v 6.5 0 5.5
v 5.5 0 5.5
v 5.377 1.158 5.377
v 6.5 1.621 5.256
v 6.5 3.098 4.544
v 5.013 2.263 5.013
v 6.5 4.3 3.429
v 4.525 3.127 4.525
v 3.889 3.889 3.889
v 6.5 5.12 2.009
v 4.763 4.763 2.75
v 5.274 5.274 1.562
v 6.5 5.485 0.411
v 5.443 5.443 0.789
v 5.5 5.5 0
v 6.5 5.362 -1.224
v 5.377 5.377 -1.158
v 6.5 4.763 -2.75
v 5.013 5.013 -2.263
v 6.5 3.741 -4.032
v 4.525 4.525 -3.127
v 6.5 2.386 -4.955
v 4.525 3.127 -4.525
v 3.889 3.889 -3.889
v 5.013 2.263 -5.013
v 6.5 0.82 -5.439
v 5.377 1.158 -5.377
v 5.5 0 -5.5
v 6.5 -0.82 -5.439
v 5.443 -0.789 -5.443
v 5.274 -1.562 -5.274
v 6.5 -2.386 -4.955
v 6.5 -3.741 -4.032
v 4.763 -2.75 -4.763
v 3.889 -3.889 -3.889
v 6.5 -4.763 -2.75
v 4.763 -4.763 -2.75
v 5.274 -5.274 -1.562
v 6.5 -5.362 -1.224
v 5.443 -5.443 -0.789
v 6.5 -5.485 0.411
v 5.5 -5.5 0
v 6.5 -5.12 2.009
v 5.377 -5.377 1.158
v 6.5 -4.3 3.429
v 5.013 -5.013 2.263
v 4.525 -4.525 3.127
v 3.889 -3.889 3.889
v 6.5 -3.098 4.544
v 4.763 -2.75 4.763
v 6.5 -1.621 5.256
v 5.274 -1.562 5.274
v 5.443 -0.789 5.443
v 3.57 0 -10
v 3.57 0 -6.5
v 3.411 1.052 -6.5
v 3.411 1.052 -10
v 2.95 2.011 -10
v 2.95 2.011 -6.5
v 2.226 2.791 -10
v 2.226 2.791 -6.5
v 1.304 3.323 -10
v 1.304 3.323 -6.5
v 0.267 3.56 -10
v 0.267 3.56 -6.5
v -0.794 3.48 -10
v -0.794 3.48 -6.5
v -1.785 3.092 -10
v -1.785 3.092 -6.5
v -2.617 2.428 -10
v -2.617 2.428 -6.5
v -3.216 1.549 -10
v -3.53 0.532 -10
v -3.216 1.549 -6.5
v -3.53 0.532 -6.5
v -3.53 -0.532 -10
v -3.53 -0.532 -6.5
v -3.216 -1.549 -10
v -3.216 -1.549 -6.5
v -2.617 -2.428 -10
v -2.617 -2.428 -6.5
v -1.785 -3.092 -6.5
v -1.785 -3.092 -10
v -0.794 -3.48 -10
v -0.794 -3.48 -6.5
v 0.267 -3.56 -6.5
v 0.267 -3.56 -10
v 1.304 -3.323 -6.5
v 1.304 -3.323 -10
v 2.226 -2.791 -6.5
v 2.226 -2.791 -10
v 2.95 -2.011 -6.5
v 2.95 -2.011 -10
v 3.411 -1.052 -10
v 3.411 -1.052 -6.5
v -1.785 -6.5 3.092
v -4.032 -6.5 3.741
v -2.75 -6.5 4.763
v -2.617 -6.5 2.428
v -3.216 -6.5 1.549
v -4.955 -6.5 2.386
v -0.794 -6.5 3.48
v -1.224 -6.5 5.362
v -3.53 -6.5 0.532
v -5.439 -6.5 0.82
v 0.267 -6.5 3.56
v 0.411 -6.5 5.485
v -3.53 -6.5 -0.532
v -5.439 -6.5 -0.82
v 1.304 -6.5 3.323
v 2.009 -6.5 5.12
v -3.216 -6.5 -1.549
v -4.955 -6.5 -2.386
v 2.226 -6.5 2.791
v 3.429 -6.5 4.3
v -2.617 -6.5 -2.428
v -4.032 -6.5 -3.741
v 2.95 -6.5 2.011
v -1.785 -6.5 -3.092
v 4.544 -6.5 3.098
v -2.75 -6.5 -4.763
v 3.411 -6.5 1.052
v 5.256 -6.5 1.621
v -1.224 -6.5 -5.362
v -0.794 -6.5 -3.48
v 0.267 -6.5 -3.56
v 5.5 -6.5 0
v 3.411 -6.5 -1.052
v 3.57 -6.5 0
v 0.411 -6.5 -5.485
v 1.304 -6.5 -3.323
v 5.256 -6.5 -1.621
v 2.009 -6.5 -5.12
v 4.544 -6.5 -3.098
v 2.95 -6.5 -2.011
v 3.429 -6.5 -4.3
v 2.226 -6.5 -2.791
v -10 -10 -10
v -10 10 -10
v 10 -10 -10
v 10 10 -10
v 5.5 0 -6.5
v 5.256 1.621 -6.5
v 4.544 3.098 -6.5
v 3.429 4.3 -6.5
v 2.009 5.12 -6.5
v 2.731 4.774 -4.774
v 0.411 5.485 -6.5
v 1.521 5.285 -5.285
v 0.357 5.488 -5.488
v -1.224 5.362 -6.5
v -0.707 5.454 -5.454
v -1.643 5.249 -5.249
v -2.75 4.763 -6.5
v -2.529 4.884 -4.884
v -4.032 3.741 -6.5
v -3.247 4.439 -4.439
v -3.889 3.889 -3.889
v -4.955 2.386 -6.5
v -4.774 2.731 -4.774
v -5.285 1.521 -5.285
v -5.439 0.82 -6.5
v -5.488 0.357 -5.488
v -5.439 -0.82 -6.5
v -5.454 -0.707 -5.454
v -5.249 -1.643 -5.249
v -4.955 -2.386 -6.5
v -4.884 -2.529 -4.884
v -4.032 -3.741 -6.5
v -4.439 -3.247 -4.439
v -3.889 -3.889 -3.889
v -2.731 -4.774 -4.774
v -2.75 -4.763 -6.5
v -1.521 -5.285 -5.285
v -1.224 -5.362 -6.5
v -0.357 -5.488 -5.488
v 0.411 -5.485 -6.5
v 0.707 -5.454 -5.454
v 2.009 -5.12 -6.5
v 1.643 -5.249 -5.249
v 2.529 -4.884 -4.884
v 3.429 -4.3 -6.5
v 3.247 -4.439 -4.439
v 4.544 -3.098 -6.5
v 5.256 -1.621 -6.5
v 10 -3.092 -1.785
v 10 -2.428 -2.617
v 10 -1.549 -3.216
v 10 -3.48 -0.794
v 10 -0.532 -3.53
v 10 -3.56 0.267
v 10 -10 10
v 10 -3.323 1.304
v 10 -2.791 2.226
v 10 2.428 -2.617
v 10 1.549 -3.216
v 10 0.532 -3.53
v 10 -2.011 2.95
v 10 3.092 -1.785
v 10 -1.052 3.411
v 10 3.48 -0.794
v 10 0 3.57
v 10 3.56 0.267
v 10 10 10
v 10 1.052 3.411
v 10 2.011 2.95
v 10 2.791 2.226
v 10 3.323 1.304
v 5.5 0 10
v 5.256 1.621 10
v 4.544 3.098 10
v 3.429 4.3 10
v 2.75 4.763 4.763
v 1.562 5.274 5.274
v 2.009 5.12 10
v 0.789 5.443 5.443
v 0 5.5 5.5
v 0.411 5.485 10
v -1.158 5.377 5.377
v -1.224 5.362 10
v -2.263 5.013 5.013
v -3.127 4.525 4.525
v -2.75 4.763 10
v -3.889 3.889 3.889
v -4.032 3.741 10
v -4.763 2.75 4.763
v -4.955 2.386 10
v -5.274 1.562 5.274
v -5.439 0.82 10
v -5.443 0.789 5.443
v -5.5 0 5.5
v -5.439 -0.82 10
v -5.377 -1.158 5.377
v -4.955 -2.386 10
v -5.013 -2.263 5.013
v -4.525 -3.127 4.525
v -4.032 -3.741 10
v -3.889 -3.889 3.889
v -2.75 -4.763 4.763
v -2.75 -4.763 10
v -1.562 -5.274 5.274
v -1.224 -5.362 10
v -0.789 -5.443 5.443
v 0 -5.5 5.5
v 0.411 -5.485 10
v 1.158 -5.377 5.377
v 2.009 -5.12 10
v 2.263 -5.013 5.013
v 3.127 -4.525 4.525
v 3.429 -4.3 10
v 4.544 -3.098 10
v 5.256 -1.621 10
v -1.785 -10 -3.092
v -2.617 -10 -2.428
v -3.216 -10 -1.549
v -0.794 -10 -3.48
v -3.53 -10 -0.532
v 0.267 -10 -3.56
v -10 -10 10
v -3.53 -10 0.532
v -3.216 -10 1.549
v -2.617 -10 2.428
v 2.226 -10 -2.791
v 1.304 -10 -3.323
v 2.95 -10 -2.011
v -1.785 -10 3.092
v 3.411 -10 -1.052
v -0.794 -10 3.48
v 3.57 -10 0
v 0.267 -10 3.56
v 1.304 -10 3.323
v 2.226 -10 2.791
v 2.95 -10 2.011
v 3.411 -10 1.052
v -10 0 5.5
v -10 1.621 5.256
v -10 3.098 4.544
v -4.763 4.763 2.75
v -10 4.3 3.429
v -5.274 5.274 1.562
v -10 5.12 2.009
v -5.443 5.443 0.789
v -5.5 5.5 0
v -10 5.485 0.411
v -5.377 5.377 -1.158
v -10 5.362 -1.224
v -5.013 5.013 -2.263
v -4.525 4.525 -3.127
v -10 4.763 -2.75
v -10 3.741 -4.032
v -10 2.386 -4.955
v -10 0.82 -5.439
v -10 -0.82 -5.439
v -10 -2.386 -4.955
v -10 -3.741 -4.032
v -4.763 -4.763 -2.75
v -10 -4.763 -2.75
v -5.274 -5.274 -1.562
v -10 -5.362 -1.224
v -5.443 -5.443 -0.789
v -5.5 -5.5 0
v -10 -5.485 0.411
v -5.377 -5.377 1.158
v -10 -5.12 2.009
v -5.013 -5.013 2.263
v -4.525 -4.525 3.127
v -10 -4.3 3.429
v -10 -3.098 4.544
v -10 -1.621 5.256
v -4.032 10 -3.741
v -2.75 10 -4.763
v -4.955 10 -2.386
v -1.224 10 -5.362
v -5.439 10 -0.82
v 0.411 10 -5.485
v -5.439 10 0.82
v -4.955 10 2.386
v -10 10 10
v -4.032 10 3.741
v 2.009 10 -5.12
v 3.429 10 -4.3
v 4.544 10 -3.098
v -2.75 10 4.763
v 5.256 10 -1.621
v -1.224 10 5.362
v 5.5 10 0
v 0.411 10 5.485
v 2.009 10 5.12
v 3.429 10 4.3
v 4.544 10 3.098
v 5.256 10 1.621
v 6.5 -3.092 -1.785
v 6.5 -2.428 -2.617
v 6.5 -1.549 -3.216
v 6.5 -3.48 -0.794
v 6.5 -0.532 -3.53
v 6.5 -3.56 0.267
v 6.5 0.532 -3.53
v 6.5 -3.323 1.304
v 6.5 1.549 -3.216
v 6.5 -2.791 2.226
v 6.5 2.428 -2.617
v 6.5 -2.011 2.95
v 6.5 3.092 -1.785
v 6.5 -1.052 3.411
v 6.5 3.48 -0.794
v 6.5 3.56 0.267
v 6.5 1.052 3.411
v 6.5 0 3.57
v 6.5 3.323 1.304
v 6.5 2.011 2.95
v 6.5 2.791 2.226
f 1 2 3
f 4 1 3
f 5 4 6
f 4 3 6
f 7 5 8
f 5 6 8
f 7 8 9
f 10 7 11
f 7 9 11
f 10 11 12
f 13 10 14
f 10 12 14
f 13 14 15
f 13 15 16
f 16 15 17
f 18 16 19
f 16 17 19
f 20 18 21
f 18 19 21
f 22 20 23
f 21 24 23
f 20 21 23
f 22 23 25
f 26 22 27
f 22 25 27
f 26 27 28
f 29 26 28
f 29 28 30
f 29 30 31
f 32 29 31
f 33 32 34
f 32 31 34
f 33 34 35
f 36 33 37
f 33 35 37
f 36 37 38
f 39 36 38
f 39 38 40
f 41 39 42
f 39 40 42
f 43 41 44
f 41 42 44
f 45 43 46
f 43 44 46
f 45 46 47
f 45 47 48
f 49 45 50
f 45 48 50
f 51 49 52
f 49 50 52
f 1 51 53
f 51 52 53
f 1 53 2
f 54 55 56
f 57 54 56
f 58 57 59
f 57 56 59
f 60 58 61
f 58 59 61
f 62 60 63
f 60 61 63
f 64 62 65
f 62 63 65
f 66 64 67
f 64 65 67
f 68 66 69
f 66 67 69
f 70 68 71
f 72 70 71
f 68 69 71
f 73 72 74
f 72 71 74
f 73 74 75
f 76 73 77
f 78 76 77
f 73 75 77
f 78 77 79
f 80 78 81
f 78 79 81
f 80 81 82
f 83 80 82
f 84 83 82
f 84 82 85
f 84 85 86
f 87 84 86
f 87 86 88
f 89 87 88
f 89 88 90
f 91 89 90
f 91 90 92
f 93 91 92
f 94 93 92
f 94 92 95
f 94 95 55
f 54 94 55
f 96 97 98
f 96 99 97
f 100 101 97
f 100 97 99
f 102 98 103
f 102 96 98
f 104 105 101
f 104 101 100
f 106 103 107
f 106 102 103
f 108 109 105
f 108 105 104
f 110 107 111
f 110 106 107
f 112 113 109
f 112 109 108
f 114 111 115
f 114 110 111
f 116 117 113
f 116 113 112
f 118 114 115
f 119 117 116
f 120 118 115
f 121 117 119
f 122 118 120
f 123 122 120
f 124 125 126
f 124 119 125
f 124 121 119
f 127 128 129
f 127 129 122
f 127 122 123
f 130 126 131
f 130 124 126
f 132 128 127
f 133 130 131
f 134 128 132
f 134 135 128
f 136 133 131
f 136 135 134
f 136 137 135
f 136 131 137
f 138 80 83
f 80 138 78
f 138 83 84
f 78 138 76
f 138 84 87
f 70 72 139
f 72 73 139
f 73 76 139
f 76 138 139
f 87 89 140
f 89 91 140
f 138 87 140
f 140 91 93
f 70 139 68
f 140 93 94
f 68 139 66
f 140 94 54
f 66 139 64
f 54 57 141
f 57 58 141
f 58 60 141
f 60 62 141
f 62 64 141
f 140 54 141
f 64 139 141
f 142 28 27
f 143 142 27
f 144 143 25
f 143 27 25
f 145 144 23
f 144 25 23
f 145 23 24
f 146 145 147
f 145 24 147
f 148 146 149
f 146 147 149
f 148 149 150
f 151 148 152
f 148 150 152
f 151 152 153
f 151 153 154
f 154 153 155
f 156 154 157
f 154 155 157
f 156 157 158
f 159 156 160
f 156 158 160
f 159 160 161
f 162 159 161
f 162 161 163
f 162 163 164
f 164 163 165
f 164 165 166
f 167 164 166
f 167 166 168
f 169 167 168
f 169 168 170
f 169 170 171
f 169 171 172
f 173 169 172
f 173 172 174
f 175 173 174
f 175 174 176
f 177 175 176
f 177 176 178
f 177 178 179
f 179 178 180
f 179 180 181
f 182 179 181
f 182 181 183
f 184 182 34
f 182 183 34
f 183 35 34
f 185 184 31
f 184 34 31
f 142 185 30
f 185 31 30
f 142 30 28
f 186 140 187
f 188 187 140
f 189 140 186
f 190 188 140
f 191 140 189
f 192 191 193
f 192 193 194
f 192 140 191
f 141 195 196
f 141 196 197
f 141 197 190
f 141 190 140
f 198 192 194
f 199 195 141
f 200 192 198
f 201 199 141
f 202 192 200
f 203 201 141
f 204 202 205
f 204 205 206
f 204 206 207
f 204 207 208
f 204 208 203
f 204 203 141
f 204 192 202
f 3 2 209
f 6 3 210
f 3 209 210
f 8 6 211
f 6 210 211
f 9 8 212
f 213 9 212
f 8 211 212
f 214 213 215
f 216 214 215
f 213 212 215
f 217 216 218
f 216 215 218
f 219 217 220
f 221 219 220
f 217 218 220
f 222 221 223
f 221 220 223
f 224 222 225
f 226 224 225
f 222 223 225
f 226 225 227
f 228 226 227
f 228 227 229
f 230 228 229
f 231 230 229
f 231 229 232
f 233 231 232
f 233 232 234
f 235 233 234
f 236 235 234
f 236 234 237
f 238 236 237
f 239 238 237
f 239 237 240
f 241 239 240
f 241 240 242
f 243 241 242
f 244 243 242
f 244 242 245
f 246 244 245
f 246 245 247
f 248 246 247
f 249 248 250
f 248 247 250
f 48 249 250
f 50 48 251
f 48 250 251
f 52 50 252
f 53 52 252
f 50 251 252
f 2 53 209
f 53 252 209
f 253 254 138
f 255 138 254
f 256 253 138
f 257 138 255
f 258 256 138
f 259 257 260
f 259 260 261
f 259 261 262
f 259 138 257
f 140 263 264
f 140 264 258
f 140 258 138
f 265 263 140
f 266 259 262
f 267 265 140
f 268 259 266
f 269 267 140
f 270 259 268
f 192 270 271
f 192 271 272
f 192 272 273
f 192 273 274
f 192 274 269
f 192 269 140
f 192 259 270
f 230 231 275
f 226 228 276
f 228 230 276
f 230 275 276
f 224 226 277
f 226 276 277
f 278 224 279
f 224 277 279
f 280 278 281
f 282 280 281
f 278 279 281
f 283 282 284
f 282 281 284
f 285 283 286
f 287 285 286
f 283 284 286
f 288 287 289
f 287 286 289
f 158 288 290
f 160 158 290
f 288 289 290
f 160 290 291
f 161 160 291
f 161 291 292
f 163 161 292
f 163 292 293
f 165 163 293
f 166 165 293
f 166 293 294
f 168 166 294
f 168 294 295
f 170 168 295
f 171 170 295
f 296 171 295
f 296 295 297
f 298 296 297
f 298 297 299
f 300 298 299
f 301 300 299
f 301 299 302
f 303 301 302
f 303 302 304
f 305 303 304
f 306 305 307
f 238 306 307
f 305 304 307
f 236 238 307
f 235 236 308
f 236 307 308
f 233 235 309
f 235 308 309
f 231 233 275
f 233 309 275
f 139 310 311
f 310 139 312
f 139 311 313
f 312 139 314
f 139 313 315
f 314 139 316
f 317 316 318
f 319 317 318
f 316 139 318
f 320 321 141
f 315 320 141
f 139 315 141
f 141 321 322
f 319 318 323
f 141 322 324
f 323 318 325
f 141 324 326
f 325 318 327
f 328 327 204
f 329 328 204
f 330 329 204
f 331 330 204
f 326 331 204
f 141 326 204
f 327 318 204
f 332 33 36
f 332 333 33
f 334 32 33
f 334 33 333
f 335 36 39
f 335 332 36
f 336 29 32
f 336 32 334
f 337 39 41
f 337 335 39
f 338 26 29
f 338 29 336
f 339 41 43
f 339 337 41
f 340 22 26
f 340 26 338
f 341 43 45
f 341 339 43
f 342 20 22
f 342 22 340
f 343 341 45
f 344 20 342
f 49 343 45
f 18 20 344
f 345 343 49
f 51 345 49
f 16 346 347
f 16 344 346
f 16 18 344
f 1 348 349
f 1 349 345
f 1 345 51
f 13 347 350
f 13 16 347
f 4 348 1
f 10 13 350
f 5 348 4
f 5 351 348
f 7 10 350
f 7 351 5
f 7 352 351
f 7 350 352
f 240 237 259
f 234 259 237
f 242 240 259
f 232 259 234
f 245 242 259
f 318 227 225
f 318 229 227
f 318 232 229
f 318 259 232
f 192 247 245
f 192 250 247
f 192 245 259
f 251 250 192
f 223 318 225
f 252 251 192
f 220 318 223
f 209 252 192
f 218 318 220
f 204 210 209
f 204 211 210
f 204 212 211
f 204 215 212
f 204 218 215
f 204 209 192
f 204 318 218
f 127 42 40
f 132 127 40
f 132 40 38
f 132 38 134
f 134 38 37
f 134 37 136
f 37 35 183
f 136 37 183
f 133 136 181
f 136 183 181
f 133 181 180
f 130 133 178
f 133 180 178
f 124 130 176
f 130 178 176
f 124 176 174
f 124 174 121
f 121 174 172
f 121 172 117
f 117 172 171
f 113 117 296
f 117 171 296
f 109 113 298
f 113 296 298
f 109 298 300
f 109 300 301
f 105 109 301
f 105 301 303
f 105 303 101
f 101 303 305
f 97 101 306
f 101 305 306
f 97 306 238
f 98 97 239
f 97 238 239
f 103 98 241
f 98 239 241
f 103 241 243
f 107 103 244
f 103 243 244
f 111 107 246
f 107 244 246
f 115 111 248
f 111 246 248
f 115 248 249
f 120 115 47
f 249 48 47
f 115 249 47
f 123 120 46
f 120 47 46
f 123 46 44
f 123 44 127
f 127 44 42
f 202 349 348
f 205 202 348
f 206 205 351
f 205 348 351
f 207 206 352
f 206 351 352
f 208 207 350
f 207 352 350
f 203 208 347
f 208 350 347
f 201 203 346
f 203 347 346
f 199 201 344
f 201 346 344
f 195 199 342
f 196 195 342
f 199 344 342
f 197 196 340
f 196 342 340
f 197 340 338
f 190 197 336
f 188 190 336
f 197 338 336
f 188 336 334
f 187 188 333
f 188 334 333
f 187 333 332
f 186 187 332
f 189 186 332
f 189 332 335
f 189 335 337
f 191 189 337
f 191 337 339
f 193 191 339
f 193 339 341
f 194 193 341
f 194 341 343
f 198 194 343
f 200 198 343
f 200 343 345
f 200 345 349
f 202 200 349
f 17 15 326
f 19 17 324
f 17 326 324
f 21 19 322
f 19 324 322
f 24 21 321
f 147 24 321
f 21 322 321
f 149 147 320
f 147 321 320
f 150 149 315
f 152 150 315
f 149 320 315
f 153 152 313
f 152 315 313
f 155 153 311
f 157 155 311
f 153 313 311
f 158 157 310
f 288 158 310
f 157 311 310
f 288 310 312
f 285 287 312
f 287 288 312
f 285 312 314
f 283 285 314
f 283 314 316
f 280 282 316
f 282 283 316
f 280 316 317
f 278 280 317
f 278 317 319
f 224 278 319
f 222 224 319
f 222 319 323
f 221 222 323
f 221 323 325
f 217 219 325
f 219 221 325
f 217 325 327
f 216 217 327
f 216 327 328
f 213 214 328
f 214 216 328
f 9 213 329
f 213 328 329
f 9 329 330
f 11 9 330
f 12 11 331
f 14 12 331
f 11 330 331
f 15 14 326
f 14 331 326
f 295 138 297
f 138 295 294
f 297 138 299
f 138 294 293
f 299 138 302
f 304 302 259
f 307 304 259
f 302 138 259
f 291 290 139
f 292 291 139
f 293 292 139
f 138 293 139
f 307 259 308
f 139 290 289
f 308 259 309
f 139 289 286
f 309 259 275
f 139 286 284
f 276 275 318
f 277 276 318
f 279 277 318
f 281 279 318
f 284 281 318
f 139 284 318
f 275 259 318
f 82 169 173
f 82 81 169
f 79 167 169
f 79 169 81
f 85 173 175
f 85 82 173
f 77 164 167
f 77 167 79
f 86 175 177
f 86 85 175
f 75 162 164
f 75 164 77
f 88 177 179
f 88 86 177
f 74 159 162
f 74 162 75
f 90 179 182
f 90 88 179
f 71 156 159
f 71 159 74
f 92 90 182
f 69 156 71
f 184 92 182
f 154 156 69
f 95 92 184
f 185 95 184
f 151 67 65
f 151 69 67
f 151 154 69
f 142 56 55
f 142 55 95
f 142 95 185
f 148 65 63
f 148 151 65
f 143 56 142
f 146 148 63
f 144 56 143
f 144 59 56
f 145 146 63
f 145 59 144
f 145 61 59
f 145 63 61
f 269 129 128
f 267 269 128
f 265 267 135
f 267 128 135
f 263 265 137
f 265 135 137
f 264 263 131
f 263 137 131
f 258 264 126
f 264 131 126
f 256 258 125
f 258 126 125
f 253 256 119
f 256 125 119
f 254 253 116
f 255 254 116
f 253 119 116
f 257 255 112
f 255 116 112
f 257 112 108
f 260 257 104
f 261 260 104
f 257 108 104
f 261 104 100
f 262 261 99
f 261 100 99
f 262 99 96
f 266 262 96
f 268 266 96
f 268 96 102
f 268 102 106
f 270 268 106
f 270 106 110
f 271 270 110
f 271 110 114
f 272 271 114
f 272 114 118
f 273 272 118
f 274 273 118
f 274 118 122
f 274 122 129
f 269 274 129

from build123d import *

# Parameters (mm, degrees)
SKETCH1_W           = 20
SKETCH1_H           = 20
BOSS_EXTRUDE1_DEPTH = 10
SKETCH2_R           = 3.57
CUT_EXTRUDE1_DEPTH  = 21
SKETCH3_R           = 5.5
CUT_EXTRUDE2_DEPTH  = 16.5
SKETCH4_R           = 3.57
CUT_EXTRUDE3_DEPTH  = 21
SKETCH5_R           = 5.5
CUT_EXTRUDE4_DEPTH  = 16.5
SKETCH6_R           = 3.57
CUT_EXTRUDE5_DEPTH  = 21
SKETCH7_R           = 5.5
CUT_EXTRUDE6_DEPTH  = 16.5


with BuildPart() as part:
    # Sketch1 → Boss-Extrude1 (new body, symmetric)
    with BuildSketch(Plane.XY):
        Rectangle(SKETCH1_W, SKETCH1_H)
    extrude(amount=BOSS_EXTRUDE1_DEPTH, both=True)

    # Sketch2 → Cut-Extrude1 (cut, through all)
    with BuildSketch(Plane.XY.offset(10)):
        Circle(SKETCH2_R)
    extrude(amount=-CUT_EXTRUDE1_DEPTH, mode=Mode.SUBTRACT)

    # Sketch3 → Cut-Extrude2 (cut)
    with BuildSketch(Plane.XY.offset(10)):
        Circle(SKETCH3_R)
    extrude(amount=-CUT_EXTRUDE2_DEPTH, mode=Mode.SUBTRACT)

    # Sketch4 → Cut-Extrude3 (cut, through all)
    with BuildSketch(Plane.ZY.offset(10)):
        Circle(SKETCH4_R)
    extrude(amount=-CUT_EXTRUDE3_DEPTH, mode=Mode.SUBTRACT)

    # Sketch5 → Cut-Extrude4 (cut)
    with BuildSketch(Plane.ZY.offset(10)):
        Circle(SKETCH5_R)
    extrude(amount=-CUT_EXTRUDE4_DEPTH, mode=Mode.SUBTRACT)

    # Sketch6 → Cut-Extrude5 (cut, through all)
    with BuildSketch(Plane(origin=(0, 10, 0), x_dir=(1, 0, 0), z_dir=(0, 1, 0))):
        Circle(SKETCH6_R)
    extrude(amount=-CUT_EXTRUDE5_DEPTH, mode=Mode.SUBTRACT)

    # Sketch7 → Cut-Extrude6 (cut)
    with BuildSketch(Plane(origin=(0, 10, 0), x_dir=(1, 0, 0), z_dir=(0, 1, 0))):
        Circle(SKETCH7_R)
    extrude(amount=-CUT_EXTRUDE6_DEPTH, mode=Mode.SUBTRACT)


solid = part.part
